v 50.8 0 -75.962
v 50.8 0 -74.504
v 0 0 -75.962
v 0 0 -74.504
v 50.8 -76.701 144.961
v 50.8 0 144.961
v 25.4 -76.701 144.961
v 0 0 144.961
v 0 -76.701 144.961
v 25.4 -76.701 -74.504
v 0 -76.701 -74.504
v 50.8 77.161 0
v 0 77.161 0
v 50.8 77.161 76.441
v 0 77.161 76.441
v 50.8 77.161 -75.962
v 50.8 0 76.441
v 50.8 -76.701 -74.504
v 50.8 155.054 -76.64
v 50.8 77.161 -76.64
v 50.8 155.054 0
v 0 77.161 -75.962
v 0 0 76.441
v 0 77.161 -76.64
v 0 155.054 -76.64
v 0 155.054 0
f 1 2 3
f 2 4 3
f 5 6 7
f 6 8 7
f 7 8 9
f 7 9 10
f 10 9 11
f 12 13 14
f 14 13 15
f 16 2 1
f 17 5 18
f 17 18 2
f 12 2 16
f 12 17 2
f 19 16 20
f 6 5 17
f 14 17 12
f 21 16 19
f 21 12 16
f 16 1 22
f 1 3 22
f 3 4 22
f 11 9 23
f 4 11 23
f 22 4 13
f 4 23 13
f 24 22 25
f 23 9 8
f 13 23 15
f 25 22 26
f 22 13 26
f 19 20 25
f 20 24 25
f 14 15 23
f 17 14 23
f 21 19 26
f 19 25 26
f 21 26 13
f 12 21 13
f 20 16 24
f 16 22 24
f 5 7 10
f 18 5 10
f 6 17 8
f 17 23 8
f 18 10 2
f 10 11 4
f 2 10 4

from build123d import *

# Parameters (mm, degrees)
F0_W     = 77.161081
F0_H     = 76.441064
F0_W_2   = 76.700576
F0_H_2   = 58.707238
F0_H_3   = 9.812578
F1_DEPTH = 25.4
F2_DEPTH = 25.4
F3_DEPTH = 25.4


with BuildPart() as f1:
    # F0 (on Right) → F1 (new body)
    with BuildSketch(Plane.YZ):
        with Locations((38.58054, 38.220532)):
            Rectangle(F0_W, F0_H)
        Polygon((0, -74.503794), (0, 0), (0, 76.441064), (-76.700576, 76.441064), (-76.700576, -74.503794), align=None)
        Polygon((77.161081, 0), (0, 0), (0, -74.503794), (0, -75.962201), (77.161081, -75.962201), align=None)
        Polygon((155.054316, 0), (77.161081, 0), (77.161081, -75.962201), (77.161081, -76.639667), (155.054316, -76.639667), align=None)
        with Locations((-38.350288, 105.794683)):
            Rectangle(F0_W_2, F0_H_2)
        with Locations((-38.350288, 140.054591)):
            Rectangle(F0_W_2, F0_H_3)
    extrude(amount=F1_DEPTH)

    # F1_face (on face) → F2 (join)
    with BuildSketch(Plane(origin=(25.4, 14.503292, 10.620267), x_dir=(0, 1, 0), z_dir=(1, 0, 0))):
        Polygon((62.657789, 65.820798), (-14.503292, 65.820798), (-14.503292, 134.340613), (-91.203867, 134.340613), (-91.203867, -85.124061), (-14.503292, -85.124061), (-14.503292, -86.582468), (62.657789, -86.582468), (62.657789, -87.259934), (140.551024, -87.259934), (140.551024, -10.620267), (62.657789, -10.620267), align=None)
    extrude(amount=-F2_DEPTH)

    # F1_face (on face) → F3 (join)
    with BuildSketch(Plane(origin=(25.4, 14.503292, 10.620267), x_dir=(0, 1, 0), z_dir=(1, 0, 0))):
        Polygon((62.657789, 65.820798), (-14.503292, 65.820798), (-14.503292, 134.340613), (-91.203867, 134.340613), (-91.203867, -85.124061), (-14.503292, -85.124061), (-14.503292, -86.582468), (62.657789, -86.582468), (62.657789, -87.259934), (140.551024, -87.259934), (140.551024, -10.620267), (62.657789, -10.620267), align=None)
    extrude(amount=F3_DEPTH)


solid = f1.part
